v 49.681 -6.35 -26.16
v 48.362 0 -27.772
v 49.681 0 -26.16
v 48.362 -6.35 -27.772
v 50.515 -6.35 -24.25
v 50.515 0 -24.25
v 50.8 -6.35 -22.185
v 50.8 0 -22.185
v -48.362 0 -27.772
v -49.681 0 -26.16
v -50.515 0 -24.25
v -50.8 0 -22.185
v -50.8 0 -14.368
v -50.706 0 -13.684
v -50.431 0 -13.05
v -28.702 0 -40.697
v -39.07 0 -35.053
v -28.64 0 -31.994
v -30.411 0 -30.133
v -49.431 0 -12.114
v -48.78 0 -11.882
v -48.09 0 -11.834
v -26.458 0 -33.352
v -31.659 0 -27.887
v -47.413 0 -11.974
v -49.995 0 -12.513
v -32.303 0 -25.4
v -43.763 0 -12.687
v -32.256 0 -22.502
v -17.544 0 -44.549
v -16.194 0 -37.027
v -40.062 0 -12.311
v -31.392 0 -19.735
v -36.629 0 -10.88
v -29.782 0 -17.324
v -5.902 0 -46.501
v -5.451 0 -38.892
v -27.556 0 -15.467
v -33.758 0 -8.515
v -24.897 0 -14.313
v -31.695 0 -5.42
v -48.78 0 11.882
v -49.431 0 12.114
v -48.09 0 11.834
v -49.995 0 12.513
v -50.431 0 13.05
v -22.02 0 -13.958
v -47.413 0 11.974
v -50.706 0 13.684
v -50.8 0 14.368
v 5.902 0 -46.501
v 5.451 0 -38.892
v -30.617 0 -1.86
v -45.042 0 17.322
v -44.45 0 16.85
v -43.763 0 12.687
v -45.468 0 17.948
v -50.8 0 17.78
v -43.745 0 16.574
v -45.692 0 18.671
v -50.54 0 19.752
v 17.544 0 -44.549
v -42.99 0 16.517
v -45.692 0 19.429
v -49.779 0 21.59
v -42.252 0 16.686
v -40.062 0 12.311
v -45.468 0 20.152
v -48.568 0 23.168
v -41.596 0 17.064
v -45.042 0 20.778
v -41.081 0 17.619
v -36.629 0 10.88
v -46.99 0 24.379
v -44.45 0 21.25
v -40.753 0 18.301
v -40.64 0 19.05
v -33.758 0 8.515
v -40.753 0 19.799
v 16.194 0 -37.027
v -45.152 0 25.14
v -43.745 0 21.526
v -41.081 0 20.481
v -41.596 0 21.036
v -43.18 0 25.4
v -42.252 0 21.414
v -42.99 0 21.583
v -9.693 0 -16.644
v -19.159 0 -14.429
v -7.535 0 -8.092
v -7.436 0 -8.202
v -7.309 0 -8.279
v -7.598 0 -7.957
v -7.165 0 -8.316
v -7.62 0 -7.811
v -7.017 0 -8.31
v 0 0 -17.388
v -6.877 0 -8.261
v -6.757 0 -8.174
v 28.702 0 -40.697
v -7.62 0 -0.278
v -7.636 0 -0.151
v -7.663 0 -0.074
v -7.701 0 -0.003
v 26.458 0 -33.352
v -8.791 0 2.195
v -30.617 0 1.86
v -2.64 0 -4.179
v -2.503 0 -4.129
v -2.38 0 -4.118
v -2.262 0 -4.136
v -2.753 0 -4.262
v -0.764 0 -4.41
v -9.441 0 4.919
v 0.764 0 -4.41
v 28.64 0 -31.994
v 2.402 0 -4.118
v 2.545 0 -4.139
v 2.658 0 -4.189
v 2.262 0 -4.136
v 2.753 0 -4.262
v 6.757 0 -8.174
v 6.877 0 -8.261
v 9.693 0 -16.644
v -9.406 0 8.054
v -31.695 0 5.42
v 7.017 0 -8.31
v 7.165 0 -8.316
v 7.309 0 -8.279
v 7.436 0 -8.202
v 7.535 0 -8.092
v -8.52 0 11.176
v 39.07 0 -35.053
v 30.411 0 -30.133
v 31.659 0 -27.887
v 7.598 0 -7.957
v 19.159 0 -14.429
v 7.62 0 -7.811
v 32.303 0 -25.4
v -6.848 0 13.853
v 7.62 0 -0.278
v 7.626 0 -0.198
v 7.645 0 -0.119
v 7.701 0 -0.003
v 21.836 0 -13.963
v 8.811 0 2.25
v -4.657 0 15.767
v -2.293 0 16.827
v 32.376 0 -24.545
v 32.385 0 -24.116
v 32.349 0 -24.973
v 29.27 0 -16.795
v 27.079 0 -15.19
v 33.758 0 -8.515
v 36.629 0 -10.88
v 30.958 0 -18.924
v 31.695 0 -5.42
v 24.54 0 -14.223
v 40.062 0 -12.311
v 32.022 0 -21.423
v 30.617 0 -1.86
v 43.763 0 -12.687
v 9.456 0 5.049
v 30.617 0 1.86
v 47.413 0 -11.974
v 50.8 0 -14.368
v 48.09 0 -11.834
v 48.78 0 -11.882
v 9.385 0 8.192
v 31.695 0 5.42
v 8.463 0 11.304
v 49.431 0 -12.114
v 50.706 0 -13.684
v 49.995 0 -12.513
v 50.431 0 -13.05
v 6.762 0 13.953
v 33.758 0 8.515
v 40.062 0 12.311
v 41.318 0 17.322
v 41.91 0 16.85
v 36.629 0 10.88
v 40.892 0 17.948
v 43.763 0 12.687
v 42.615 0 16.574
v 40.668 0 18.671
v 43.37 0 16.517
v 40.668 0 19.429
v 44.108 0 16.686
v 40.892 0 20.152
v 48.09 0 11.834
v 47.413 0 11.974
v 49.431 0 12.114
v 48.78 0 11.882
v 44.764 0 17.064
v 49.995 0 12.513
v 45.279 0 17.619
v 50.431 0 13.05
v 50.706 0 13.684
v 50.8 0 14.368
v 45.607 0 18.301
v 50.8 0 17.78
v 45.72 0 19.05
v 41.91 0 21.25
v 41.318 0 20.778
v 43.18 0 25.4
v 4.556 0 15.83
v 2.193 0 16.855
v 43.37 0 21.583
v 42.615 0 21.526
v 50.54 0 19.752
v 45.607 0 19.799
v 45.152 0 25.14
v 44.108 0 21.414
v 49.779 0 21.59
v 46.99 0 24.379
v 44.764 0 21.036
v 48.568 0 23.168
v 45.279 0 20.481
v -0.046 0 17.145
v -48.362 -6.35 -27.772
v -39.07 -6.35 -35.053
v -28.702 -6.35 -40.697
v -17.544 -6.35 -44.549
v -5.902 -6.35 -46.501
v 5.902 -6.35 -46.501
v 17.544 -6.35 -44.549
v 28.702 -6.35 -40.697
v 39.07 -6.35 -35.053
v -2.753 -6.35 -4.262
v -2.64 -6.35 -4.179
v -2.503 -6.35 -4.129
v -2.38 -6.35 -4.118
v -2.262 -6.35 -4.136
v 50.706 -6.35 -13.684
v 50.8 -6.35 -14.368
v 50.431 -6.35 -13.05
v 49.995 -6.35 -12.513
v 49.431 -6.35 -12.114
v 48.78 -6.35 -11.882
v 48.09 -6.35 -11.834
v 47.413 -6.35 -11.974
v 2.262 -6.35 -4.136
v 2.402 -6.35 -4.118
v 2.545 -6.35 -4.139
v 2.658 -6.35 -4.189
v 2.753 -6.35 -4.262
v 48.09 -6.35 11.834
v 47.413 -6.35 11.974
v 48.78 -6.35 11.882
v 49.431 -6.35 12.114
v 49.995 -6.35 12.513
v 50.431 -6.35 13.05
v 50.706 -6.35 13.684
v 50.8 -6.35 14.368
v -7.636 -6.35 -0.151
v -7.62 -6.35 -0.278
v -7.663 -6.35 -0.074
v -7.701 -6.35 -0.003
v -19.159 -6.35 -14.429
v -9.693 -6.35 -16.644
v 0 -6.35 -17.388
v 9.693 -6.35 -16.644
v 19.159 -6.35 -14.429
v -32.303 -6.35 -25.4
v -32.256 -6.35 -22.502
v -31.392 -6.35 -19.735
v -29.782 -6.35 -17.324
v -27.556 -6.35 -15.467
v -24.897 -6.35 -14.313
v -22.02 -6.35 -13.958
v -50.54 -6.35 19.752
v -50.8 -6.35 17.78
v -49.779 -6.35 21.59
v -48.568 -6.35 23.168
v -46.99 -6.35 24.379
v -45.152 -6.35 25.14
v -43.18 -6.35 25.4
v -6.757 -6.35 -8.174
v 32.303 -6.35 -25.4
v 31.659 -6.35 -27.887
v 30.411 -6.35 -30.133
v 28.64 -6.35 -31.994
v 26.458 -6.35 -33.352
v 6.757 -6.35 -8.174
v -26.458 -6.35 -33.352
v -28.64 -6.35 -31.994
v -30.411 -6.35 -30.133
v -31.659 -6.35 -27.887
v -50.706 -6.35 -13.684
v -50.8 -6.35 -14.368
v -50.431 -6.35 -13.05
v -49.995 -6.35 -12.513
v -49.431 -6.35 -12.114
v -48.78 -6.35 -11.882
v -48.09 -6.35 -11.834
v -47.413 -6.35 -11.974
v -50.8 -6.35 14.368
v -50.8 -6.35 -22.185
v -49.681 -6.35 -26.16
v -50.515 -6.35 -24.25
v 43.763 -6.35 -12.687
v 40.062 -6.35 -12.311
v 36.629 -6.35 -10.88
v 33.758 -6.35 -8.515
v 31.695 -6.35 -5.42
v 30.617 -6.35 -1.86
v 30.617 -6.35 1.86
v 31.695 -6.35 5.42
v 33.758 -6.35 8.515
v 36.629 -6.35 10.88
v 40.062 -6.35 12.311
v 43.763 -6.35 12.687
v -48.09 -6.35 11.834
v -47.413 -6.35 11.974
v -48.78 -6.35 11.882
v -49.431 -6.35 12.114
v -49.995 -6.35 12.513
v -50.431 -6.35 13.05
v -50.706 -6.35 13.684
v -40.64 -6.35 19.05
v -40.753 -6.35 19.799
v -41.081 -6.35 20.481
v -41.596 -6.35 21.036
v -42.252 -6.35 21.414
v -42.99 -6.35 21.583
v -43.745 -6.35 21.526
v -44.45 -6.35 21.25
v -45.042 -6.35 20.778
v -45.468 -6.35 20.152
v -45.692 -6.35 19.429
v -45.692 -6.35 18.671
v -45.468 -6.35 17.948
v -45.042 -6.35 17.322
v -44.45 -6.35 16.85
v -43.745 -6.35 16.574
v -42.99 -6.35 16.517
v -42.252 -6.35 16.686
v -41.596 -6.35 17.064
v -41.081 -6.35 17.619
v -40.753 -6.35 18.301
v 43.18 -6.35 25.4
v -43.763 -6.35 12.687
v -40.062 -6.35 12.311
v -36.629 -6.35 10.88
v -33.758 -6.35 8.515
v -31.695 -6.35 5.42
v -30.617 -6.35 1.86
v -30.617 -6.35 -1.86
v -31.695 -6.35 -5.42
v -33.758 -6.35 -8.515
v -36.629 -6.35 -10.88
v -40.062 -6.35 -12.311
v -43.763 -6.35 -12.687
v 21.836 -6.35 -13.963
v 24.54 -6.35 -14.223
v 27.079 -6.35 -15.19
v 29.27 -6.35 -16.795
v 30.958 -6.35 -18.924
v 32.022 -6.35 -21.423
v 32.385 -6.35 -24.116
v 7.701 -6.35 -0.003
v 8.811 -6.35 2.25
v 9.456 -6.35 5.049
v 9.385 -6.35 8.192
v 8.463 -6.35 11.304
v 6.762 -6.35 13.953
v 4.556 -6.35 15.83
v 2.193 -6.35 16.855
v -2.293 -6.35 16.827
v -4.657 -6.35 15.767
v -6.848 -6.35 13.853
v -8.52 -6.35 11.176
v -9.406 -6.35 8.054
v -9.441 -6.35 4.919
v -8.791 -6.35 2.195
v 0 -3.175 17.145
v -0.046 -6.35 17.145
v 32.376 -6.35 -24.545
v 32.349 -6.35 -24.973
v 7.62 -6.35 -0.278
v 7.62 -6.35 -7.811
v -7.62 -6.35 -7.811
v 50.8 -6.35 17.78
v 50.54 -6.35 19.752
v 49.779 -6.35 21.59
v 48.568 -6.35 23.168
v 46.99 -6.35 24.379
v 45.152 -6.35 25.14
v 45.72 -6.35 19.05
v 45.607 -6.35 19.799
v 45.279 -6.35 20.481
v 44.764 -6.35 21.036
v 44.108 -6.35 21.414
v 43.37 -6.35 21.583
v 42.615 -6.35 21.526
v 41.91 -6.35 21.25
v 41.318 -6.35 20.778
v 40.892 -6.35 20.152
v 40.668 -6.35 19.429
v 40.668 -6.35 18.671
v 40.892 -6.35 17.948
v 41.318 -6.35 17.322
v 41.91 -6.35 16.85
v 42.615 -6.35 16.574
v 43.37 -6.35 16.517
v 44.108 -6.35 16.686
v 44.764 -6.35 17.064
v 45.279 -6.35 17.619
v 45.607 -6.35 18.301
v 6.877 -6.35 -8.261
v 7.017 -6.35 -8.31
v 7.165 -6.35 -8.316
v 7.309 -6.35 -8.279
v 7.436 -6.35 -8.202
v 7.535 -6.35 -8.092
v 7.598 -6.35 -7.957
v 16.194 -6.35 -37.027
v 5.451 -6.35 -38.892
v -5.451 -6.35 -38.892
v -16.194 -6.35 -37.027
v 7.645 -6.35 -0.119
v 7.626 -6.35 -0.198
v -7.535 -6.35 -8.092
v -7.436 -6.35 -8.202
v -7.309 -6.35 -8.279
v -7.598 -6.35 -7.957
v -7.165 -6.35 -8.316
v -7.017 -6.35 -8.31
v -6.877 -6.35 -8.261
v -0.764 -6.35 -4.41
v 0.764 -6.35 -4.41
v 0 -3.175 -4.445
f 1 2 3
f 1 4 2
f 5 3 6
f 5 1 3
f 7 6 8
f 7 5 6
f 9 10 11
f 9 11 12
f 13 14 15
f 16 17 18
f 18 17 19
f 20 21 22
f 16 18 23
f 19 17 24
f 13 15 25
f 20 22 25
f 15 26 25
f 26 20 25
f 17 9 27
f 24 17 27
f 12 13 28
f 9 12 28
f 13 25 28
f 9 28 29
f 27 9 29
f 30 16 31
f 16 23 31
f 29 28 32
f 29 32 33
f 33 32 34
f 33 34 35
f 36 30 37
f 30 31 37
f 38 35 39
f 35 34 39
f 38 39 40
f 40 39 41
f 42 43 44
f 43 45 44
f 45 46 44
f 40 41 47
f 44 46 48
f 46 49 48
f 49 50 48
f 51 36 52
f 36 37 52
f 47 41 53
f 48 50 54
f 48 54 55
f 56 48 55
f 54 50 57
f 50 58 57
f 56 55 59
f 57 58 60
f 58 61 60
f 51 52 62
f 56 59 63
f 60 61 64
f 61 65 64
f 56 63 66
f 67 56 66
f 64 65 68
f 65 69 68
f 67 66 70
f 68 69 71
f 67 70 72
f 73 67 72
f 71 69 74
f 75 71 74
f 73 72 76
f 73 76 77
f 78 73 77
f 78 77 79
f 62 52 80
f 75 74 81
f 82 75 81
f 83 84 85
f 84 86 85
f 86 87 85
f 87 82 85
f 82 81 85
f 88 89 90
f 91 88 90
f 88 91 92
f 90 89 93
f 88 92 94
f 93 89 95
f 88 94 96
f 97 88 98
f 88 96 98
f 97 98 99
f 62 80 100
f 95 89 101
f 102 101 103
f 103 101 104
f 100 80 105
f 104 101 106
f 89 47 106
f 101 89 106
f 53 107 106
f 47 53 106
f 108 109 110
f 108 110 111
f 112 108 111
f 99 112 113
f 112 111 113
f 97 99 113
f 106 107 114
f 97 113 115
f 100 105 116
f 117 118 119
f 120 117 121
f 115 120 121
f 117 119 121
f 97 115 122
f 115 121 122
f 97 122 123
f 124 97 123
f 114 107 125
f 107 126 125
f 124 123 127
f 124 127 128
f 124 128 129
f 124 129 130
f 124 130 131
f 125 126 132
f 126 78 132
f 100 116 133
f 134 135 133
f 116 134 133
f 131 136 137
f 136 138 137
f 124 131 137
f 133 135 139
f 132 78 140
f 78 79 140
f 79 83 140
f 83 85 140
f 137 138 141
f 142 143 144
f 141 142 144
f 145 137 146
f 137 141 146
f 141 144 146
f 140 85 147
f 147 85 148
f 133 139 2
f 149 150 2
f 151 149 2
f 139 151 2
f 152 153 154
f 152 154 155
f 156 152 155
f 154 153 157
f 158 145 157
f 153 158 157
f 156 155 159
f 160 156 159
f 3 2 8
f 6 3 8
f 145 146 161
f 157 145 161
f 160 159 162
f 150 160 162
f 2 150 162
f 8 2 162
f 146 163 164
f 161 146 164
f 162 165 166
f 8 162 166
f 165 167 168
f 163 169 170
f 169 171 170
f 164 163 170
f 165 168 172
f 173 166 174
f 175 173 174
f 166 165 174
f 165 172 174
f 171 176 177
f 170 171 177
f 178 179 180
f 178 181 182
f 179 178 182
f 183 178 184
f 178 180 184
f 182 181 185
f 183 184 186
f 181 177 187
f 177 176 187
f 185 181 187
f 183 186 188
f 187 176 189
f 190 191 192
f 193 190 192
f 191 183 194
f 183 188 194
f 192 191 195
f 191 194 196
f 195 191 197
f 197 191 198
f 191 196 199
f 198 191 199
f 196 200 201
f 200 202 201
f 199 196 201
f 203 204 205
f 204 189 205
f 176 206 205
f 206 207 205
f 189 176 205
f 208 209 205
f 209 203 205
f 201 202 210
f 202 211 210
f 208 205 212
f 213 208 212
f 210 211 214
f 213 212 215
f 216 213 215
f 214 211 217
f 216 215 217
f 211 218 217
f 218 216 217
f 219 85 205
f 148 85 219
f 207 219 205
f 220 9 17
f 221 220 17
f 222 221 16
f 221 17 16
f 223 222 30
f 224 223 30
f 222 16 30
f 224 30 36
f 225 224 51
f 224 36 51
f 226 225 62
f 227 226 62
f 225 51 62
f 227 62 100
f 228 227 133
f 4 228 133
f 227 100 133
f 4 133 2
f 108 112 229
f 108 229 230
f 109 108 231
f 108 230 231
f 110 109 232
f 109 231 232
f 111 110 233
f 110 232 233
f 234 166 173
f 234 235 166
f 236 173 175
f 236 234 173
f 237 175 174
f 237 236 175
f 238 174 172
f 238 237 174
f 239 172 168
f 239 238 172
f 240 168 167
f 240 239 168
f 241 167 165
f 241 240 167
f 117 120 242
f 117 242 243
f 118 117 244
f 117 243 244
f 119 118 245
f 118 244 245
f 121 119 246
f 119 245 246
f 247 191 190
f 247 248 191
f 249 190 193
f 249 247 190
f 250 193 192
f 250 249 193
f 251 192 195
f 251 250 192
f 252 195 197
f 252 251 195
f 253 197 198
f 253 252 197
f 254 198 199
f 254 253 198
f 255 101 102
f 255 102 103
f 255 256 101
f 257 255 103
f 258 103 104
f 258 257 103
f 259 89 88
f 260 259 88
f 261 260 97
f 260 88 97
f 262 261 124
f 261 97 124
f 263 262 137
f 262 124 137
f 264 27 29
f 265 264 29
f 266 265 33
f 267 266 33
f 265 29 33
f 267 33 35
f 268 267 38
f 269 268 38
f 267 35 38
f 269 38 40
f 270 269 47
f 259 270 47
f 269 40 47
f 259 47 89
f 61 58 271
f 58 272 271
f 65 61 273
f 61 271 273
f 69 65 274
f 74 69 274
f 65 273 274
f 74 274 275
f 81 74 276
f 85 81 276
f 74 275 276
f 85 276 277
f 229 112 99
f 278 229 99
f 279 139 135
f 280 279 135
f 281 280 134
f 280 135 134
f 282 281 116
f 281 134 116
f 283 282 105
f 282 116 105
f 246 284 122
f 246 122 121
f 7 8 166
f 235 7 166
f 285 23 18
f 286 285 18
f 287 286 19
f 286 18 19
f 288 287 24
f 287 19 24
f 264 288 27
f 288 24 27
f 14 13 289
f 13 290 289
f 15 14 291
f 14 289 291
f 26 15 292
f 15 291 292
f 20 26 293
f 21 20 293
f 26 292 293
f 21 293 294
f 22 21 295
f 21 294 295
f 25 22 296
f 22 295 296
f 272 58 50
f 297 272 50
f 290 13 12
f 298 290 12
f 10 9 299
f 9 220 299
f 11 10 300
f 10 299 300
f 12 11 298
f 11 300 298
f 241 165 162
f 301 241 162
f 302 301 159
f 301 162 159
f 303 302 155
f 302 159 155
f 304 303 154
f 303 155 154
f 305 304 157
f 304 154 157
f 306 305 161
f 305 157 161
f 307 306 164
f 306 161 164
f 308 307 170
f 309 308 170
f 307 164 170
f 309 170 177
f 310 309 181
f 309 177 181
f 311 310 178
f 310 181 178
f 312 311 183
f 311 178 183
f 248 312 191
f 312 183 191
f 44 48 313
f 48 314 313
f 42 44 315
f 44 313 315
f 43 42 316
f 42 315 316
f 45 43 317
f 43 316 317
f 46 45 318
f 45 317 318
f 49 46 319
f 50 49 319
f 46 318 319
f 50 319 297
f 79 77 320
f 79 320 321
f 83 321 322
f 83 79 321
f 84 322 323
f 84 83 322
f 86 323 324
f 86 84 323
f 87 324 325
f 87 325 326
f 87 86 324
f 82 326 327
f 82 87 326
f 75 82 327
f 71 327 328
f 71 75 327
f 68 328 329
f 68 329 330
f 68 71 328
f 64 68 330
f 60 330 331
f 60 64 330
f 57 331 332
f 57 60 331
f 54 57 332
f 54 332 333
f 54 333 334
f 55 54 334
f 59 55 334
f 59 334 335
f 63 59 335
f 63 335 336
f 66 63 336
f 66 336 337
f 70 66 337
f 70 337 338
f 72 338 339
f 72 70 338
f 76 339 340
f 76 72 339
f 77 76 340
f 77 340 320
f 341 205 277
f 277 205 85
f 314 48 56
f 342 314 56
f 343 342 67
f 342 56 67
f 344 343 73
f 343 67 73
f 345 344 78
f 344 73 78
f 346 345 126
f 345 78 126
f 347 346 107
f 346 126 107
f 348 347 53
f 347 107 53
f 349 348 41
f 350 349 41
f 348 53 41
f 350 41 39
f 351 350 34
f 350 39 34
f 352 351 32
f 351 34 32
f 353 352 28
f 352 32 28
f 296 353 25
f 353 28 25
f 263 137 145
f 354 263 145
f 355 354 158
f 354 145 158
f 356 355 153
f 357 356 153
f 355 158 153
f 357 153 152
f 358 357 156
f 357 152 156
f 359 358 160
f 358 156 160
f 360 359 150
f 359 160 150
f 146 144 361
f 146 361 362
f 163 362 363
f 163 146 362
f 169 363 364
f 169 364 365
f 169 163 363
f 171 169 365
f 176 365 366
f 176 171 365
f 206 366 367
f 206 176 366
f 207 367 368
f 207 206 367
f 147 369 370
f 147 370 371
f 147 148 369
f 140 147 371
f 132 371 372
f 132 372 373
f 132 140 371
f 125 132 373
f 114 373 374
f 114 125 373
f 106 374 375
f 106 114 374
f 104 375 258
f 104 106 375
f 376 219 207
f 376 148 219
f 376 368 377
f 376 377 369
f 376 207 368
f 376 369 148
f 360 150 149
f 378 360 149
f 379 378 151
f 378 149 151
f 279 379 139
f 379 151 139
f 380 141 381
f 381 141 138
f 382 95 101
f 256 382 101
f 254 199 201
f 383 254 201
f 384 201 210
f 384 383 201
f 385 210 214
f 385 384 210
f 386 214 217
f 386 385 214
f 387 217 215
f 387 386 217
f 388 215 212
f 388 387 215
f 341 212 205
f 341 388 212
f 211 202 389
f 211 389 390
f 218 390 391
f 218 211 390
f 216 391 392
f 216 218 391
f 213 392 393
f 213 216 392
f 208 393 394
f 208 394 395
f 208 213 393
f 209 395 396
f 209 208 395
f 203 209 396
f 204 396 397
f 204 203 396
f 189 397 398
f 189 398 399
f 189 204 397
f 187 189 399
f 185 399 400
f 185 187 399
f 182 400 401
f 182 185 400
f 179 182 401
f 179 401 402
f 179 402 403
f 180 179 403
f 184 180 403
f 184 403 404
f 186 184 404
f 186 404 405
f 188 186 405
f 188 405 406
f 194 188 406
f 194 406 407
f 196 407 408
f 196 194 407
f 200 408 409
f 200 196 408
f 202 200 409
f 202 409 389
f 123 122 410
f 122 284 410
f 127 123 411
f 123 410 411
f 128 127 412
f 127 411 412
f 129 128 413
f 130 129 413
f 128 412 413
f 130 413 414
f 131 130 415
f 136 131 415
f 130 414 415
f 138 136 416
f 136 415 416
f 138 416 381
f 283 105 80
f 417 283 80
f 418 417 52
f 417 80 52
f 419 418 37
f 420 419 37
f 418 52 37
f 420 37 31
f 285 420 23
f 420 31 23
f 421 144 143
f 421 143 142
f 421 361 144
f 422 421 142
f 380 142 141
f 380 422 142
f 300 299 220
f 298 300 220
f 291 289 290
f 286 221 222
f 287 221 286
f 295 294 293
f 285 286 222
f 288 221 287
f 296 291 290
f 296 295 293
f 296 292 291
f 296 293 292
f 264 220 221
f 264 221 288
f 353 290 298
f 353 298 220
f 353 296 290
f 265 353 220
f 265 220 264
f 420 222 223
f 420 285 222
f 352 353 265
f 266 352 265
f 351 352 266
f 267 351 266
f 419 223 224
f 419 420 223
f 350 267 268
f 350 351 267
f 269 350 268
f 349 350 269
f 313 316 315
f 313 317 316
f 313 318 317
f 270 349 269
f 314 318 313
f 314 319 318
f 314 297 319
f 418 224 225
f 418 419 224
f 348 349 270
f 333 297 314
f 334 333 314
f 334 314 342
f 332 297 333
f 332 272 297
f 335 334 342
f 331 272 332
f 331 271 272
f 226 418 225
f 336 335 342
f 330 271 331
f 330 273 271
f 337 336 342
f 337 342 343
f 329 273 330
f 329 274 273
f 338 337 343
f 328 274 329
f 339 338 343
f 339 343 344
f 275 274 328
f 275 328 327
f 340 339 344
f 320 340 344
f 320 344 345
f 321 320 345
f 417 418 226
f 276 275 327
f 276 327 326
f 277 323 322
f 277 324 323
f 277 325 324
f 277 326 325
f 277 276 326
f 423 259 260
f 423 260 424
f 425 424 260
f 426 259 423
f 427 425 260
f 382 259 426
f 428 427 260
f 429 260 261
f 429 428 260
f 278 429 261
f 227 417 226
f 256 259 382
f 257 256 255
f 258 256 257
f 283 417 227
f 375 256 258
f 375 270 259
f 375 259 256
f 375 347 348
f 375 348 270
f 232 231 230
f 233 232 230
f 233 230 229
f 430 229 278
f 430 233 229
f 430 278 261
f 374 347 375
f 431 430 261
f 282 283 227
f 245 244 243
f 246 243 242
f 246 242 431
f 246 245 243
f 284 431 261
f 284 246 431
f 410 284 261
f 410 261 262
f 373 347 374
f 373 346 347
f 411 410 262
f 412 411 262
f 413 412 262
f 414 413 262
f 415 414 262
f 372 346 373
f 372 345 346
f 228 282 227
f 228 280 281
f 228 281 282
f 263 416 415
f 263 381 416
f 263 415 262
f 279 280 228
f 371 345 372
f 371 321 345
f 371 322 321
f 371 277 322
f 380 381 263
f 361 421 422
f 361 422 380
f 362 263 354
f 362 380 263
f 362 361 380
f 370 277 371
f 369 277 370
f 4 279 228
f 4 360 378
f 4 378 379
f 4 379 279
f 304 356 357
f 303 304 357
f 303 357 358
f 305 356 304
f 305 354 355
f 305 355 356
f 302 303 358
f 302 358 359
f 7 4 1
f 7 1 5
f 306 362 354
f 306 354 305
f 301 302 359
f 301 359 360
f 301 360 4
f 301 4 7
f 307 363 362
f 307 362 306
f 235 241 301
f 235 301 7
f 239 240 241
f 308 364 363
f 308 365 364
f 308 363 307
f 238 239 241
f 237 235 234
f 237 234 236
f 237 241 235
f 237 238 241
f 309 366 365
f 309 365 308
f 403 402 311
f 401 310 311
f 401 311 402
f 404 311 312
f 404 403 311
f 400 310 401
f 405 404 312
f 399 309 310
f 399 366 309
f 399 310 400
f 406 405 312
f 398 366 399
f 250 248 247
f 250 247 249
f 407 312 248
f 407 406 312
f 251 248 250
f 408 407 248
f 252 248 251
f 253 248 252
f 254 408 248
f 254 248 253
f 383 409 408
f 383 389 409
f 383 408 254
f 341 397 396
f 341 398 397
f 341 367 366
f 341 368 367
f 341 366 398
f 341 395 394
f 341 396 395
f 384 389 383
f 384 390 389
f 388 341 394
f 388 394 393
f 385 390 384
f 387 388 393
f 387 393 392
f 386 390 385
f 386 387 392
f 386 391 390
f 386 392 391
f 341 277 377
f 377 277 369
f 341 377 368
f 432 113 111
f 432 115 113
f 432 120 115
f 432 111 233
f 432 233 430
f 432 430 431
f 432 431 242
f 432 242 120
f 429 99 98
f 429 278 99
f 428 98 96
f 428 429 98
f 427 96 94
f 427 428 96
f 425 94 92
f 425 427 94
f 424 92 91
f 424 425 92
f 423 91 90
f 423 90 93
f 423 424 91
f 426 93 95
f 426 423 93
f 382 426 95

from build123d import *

# Parameters (mm, degrees)
F0_R     = 2.54
F1_DEPTH = 6.35
F2_R     = 7.62
F3_R     = 2.54
F4_R     = 0.508


with BuildPart() as f1:
    # F0 (on Front) → F1 (new body)
    with BuildSketch(Plane.XZ):
        with BuildLine():
            Line((-32.303487, -25.4), (-50.8, -25.4))
            ThreePointArc((-50.8, -25.4), (0, -46.746368), (50.8, -25.4))
            Line((50.8, -25.4), (32.303487, -25.4))
            ThreePointArc((32.303487, -25.4), (30.411219, -30.133186), (26.458333, -33.351637))
            ThreePointArc((26.458333, -33.351637), (0, -39.126368), (-26.458333, -33.351637))
            ThreePointArc((-26.458333, -33.351637), (-30.411219, -30.133186), (-32.303487, -25.4))
        make_face()
        with BuildLine():
            Line((50.8, 25.4), (-50.8, 25.4))
            Line((-50.8, 25.4), (-50.8, 10.16))
            ThreePointArc((-50.8, 10.16), (-30.48, 0), (-50.8, -10.16))
            Line((-50.8, -10.16), (-50.8, -25.4))
            Line((-50.8, -25.4), (-32.303487, -25.4))
            ThreePointArc((-32.303487, -25.4), (-28.735423, -16.315594), (-19.159483, -14.429098))
            ThreePointArc((-19.159483, -14.429098), (0, -17.388498), (19.159483, -14.429098))
            ThreePointArc((19.159483, -14.429098), (28.22833, -15.91891), (32.385, -24.115594))
            ThreePointArc((32.385, -24.115594), (32.364601, -24.759089), (32.303487, -25.4))
            Line((32.303487, -25.4), (50.8, -25.4))
            Line((50.8, -25.4), (50.8, -10.16))
            ThreePointArc((50.8, -10.16), (30.48, 0), (50.8, 10.16))
            Line((50.8, 10.16), (50.8, 25.4))
        make_face()
        with BuildLine():
            Line((-7.62, -9.017), (-7.62, -0.127))
            add(Edge.make_bspline(
                [(0, 17.145), (-19.05, 17.145), (-7.62, -0.127)],
                knots=[0, 0, 0, 2.214297, 2.214297, 2.214297], degree=2, weights=[1, 0.447214, 1]))
            add(Edge.make_bspline(
                [(7.62, -0.127), (19.05, 17.145), (0, 17.145)],
                knots=[4.068888, 4.068888, 4.068888, 6.283185, 6.283185, 6.283185], degree=2, weights=[1, 0.447214, 1]))
            Line((7.62, -0.127), (7.62, -9.017))
            Line((7.62, -9.017), (2.54, -4.0541))
            add(Edge.make_bspline(
                [(-2.54, -4.0541), (0, -4.850586), (2.54, -4.0541)],
                knots=[2.87166, 2.87166, 2.87166, 3.411525, 3.411525, 3.411525], degree=2, weights=[1, 0.963789, 1]))
            Line((-2.54, -4.0541), (-7.62, -9.017))
        make_face(mode=Mode.SUBTRACT)
        with Locations((-43.18, 19.05)):
            Circle(F0_R, mode=Mode.SUBTRACT)
        with Locations((43.18, 19.05)):
            Circle(F0_R, mode=Mode.SUBTRACT)
    extrude(amount=F1_DEPTH)

    # F2
    f2_edges = [f1.edges().sort_by_distance(p)[0] for p in [
        (50.8, -3.175, -25.4),
        (-50.8, -3.175, -25.4),
        (-50.8, -3.175, 25.4),
        (50.8, -3.175, 25.4),
    ]]
    fillet(f2_edges, radius=F2_R)

    # F3
    f3_edges = [f1.edges().sort_by_distance(p)[0] for p in [
        (-50.8, -3.175, -10.16),
        (50.8, -3.175, -10.16),
        (50.8, -3.175, 10.16),
        (-50.8, -3.175, 10.16),
    ]]
    fillet(f3_edges, radius=F3_R)

    # F4
    f4_edges = [f1.edges().sort_by_distance(p)[0] for p in [
        (-7.62, -3.175, -0.127),
        (-2.54, -3.175, -4.0541),
        (2.54, -3.175, -4.0541),
        (-7.62, -3.175, -9.017),
        (7.62, -3.175, -9.017),
        (7.62, -3.175, -0.127),
    ]]
    fillet(f4_edges, radius=F4_R)


solid = f1.part
